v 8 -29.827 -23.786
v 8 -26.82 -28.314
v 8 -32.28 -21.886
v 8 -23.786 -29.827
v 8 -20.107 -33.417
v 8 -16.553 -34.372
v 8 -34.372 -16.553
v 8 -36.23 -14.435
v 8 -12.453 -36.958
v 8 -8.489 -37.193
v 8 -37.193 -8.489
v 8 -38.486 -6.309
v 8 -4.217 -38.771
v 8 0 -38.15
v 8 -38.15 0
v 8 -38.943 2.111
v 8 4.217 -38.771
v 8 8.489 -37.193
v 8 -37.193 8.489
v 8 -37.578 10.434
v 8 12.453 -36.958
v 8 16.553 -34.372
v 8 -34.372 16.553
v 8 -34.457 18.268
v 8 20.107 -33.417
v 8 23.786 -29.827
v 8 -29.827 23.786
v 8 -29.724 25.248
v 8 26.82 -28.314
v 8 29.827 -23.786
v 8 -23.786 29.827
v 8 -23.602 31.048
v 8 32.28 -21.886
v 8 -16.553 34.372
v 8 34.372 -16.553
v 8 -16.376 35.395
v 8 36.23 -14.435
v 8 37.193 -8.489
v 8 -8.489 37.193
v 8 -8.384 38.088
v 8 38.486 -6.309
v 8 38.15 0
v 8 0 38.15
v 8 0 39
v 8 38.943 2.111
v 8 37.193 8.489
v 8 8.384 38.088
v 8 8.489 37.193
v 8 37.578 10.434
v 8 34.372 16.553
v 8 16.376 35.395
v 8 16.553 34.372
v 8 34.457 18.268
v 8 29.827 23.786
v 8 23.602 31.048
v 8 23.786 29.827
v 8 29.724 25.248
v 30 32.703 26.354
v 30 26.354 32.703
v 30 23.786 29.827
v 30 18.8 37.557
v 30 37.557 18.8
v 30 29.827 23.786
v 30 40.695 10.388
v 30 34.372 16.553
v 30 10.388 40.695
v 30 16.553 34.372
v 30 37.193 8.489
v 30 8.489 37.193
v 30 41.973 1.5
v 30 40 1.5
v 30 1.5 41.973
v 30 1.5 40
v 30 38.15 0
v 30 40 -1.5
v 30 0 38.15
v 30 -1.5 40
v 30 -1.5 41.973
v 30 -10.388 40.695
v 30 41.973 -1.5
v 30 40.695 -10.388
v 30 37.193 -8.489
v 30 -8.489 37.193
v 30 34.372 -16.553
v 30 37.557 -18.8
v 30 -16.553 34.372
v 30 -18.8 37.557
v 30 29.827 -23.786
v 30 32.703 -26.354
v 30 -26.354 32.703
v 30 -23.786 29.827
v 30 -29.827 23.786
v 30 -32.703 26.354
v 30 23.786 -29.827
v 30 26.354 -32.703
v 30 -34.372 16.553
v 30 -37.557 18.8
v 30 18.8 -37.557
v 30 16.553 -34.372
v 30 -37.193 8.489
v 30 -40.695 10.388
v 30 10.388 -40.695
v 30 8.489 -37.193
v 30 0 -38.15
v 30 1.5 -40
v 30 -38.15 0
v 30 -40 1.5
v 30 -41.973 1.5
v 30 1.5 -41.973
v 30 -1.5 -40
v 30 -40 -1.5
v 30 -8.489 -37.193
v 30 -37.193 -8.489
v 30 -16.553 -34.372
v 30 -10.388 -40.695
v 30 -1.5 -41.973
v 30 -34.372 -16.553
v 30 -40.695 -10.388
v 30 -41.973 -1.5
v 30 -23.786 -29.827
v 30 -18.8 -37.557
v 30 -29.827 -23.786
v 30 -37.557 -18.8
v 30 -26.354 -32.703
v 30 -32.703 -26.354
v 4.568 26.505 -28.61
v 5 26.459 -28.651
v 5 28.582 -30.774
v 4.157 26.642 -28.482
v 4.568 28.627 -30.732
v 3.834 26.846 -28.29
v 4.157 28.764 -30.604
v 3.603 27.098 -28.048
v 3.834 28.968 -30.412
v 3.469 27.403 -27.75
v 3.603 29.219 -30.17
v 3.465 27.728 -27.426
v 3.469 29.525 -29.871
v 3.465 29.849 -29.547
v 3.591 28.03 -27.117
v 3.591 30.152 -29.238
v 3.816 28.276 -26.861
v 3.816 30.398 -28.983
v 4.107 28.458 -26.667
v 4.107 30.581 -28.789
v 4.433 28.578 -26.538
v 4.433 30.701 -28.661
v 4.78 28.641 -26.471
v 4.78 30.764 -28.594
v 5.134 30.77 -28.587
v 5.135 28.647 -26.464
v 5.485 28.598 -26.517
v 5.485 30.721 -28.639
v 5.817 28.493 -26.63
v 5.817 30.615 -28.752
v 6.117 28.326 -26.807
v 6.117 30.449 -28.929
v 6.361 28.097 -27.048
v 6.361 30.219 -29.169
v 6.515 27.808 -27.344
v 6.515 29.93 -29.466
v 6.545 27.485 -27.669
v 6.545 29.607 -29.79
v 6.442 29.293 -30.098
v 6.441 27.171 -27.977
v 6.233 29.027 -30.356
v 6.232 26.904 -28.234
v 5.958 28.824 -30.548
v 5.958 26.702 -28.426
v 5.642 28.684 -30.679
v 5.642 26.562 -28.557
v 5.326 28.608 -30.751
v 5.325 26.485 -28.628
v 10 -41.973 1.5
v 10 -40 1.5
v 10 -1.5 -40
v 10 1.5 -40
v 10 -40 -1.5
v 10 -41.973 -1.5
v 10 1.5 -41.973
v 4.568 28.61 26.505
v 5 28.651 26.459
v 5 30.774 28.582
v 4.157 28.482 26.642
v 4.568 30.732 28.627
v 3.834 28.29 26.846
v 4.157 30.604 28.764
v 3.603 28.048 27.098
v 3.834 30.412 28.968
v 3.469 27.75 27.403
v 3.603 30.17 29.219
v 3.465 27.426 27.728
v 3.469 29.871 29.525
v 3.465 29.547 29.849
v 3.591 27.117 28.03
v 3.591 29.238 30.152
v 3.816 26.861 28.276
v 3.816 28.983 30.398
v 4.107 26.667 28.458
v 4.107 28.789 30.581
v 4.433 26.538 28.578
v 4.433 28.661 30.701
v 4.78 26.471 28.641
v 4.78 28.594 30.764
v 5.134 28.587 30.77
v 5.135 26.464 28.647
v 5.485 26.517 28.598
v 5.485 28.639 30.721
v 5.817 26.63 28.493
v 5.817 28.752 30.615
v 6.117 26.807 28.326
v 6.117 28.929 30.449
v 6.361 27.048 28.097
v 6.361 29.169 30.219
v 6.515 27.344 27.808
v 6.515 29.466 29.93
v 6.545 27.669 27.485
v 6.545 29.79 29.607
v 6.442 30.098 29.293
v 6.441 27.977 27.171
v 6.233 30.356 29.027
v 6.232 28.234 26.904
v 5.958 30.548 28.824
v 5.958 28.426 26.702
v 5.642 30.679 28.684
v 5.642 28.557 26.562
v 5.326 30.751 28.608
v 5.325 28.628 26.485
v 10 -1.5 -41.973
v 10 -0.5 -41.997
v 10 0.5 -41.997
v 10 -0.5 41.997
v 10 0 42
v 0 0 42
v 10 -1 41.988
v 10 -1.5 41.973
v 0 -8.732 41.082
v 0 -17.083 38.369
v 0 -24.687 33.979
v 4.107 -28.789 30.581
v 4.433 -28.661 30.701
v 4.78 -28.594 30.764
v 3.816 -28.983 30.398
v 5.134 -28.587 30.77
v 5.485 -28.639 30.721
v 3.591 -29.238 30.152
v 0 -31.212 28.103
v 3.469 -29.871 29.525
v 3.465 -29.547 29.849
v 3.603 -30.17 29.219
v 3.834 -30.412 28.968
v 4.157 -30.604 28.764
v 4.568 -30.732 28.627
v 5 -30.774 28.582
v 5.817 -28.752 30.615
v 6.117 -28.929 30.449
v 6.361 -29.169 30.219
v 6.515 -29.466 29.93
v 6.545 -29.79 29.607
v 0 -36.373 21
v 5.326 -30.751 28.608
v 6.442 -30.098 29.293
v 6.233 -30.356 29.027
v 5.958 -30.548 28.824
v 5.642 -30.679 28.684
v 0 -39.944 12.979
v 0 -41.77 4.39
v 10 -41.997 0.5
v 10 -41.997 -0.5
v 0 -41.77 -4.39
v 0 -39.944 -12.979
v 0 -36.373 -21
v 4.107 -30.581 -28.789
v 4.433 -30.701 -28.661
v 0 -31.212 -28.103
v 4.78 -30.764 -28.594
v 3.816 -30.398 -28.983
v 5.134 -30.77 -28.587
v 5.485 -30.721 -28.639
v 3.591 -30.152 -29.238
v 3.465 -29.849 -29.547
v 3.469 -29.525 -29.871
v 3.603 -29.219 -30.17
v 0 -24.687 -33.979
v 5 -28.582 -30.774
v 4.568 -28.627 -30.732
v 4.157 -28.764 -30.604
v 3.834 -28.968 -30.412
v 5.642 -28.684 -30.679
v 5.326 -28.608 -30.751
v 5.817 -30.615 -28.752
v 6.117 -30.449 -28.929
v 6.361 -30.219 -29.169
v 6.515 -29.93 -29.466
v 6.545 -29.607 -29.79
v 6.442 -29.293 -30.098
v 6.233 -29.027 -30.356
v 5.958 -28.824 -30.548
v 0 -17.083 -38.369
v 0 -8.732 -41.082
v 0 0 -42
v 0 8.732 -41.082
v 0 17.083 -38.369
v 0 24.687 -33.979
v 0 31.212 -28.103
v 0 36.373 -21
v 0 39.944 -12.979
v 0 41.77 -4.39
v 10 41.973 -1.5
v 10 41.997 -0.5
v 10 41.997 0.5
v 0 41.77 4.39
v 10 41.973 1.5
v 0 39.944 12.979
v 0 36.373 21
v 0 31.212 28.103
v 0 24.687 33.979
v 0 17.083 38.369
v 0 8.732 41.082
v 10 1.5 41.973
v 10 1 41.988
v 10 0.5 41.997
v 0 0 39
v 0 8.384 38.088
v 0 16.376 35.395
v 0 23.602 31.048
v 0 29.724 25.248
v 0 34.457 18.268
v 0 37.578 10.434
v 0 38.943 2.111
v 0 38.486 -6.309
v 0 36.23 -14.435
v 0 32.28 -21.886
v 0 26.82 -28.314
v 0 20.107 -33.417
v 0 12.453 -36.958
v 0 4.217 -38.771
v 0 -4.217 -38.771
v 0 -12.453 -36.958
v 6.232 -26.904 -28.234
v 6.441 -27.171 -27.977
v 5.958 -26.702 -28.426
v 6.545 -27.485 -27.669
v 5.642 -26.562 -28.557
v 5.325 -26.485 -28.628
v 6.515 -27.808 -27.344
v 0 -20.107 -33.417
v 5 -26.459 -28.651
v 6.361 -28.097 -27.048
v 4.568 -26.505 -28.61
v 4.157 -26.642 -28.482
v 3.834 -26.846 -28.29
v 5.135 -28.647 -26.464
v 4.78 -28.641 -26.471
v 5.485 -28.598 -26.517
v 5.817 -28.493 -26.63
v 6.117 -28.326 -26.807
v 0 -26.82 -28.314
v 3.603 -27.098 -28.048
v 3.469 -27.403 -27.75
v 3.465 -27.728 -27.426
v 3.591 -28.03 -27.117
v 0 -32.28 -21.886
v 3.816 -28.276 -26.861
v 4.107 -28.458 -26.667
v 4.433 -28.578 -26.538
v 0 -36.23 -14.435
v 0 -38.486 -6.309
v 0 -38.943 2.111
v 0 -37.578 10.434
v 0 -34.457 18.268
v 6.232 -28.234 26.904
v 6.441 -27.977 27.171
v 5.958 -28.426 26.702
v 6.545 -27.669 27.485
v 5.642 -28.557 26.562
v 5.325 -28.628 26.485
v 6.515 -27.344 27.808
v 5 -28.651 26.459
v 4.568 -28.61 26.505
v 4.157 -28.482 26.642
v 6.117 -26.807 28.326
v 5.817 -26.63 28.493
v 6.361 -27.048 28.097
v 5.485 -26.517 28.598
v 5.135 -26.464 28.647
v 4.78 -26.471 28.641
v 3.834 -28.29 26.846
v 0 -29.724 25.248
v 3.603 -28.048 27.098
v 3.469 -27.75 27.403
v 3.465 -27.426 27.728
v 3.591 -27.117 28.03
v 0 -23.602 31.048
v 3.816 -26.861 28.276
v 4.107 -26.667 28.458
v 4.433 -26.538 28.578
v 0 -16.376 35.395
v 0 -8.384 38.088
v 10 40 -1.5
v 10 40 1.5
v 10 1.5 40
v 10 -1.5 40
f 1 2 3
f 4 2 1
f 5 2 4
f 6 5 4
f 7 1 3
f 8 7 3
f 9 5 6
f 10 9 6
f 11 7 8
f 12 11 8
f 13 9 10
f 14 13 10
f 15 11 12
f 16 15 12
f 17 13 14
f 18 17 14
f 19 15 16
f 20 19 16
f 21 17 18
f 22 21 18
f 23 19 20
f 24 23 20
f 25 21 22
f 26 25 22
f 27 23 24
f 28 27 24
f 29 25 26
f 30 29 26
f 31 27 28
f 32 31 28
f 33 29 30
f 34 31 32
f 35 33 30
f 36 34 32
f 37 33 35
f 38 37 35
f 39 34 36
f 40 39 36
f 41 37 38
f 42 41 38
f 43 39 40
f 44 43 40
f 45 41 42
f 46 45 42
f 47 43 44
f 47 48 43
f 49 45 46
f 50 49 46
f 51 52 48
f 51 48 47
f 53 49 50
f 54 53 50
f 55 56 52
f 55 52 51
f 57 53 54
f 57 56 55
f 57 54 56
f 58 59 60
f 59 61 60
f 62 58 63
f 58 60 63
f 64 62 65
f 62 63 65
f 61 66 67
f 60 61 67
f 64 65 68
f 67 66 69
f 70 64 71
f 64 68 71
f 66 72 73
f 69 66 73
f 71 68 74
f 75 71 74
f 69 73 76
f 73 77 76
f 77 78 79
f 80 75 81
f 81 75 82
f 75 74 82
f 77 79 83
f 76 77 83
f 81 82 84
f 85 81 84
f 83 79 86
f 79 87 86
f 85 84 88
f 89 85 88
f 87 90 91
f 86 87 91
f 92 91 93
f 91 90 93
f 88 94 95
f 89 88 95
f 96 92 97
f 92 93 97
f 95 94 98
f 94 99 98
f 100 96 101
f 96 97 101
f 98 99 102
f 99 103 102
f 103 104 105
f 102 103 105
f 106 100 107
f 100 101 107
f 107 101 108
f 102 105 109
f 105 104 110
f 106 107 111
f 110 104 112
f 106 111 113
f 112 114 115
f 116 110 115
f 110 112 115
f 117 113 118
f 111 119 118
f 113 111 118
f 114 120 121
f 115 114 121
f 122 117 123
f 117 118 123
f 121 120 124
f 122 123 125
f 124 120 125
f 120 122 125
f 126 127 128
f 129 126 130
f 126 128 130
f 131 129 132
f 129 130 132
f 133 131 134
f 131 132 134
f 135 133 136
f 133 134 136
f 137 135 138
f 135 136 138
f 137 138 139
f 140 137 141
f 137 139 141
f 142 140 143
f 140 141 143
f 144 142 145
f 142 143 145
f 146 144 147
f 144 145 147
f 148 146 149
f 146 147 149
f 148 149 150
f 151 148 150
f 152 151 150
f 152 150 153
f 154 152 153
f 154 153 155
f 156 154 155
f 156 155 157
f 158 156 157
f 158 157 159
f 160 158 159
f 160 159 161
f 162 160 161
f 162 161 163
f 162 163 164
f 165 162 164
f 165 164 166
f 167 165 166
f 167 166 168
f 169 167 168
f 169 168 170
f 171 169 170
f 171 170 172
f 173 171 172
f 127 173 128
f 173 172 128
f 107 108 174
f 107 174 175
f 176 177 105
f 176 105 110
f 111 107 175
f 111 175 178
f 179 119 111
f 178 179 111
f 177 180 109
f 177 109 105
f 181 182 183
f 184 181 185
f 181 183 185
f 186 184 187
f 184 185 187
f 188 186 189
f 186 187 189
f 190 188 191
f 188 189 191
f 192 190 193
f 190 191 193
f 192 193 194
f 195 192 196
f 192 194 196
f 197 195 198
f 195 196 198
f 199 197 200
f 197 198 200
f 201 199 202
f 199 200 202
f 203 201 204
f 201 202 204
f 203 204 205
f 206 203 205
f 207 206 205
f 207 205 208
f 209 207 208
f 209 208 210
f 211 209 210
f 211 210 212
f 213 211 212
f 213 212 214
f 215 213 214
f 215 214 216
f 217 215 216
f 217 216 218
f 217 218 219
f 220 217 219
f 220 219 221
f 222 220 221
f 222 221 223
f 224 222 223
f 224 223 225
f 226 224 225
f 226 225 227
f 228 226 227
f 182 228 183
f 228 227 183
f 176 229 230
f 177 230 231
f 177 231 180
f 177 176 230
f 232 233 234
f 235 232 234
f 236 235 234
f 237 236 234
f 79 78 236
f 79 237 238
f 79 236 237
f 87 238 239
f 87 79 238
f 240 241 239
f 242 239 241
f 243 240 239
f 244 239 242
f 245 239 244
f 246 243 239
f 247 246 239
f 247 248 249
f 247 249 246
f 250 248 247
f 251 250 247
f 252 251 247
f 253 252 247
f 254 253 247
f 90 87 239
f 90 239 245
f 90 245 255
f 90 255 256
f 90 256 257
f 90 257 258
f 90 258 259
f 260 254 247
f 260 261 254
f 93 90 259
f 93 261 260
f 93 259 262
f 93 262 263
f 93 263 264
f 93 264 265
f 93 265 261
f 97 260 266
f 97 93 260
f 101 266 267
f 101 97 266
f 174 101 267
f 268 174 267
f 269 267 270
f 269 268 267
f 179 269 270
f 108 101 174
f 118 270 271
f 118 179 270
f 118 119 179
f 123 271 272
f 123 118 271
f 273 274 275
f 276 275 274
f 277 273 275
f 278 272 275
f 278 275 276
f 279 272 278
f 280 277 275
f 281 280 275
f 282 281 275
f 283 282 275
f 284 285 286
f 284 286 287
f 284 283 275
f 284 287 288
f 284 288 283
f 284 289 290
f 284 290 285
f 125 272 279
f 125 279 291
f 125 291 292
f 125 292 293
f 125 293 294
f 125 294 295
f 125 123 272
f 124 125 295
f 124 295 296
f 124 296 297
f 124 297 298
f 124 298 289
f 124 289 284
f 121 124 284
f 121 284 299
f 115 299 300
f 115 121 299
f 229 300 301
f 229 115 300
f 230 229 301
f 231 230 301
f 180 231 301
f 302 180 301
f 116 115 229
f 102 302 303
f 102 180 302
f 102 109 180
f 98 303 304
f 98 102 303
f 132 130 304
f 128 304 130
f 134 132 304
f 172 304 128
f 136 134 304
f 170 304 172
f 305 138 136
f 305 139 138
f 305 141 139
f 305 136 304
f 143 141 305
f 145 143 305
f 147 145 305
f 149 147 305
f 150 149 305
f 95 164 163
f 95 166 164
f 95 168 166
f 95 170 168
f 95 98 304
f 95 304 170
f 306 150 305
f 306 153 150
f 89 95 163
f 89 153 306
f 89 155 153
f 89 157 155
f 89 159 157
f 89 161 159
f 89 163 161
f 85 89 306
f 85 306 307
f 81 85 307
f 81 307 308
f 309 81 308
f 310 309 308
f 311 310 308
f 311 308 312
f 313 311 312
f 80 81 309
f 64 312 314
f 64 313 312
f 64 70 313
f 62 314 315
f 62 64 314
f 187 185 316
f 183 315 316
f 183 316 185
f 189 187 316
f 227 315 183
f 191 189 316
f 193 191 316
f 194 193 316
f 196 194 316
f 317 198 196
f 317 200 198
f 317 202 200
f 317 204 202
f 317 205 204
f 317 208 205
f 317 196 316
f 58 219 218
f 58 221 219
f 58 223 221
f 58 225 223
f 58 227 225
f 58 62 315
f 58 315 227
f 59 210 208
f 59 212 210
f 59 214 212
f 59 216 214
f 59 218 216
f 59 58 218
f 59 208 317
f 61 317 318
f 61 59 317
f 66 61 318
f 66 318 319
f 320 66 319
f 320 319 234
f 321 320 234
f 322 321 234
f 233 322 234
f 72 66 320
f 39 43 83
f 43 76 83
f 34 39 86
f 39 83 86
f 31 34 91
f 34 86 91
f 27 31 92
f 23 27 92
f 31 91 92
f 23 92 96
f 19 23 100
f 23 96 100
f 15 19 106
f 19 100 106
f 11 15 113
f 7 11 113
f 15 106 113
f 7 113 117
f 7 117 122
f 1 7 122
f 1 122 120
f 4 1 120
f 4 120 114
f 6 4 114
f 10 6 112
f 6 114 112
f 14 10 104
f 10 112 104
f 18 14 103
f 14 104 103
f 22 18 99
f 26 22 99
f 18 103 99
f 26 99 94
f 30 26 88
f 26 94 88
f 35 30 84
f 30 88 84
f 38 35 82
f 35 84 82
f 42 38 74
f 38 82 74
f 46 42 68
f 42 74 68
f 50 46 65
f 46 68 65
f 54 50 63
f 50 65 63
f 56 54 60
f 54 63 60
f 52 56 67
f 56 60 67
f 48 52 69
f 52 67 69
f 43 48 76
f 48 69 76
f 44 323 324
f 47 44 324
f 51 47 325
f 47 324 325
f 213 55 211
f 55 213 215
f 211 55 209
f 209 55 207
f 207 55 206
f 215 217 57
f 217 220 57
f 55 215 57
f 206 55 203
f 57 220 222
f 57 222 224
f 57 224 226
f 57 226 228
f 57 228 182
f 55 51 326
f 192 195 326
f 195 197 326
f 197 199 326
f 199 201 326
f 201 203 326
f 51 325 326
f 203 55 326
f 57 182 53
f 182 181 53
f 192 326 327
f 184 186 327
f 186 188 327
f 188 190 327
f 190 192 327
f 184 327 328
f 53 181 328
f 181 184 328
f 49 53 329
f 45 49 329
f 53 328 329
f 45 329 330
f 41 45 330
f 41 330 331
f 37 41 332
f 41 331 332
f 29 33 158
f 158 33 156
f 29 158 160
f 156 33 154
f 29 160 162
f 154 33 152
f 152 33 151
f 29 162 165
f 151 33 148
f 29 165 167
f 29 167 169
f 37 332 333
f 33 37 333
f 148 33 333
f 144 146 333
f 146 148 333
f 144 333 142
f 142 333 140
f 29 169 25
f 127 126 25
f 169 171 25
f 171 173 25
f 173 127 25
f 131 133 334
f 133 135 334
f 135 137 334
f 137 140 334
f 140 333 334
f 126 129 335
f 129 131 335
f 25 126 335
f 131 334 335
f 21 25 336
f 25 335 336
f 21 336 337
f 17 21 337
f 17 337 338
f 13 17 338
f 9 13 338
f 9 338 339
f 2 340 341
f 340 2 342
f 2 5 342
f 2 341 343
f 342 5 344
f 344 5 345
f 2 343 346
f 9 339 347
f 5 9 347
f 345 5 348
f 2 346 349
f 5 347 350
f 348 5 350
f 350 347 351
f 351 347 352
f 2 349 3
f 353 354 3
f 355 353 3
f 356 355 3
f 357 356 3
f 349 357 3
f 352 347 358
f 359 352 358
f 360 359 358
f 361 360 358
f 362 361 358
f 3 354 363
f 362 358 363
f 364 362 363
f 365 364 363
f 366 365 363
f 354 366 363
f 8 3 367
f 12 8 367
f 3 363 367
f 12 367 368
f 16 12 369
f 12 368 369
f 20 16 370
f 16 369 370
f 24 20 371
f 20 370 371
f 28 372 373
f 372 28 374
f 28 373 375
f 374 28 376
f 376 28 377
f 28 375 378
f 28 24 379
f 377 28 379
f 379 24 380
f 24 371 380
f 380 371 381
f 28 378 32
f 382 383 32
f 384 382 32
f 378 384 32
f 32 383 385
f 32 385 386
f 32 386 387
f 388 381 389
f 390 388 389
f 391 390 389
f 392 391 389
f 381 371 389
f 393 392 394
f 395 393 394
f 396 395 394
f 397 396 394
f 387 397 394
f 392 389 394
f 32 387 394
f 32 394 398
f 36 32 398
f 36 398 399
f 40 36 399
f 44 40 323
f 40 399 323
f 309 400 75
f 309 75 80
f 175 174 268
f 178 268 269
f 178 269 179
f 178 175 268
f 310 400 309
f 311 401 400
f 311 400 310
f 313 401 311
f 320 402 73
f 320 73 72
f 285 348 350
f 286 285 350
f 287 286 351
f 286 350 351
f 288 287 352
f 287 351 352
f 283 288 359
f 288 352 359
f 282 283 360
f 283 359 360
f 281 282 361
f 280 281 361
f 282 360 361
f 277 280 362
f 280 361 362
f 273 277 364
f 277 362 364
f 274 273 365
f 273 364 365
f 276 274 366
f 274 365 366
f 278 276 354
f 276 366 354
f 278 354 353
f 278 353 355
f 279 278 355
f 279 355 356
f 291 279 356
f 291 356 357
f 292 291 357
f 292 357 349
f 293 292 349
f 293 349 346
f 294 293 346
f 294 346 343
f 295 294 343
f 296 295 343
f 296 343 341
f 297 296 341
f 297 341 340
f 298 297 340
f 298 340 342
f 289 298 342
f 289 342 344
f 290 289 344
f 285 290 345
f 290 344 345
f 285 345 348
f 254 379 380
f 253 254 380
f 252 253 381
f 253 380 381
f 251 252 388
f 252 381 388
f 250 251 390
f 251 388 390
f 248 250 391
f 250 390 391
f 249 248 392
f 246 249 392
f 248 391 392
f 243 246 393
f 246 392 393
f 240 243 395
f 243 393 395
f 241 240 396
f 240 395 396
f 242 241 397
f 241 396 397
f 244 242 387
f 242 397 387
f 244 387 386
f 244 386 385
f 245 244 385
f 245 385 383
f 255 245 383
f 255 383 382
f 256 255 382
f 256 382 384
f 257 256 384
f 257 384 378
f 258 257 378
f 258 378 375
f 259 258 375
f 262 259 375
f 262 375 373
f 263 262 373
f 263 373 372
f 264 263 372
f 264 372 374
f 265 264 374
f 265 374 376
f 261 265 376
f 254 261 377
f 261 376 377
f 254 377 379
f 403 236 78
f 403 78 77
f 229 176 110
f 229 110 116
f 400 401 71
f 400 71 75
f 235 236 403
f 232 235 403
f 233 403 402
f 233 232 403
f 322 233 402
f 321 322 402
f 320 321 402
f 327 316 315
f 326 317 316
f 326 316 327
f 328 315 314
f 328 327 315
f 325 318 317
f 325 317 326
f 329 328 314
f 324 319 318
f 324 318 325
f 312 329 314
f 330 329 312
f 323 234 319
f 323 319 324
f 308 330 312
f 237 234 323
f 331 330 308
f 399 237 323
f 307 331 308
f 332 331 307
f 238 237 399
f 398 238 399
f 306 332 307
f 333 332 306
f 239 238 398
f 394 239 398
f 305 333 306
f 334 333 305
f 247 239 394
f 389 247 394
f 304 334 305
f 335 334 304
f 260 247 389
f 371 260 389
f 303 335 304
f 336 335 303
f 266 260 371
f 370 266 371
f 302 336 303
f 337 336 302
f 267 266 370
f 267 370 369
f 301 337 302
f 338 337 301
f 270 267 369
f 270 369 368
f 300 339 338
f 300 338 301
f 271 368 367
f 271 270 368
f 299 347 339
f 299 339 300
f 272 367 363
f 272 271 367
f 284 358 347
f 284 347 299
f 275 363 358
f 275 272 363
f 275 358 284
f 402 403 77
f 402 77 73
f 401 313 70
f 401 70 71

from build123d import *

# Parameters (mm, degrees)
ESQUISSE1_W                  = 30
ESQUISSE1_H                  = 3.85
D_GAGEMENT_M2_51_D           = 3.1
R_P_TITION_CIRCULAIRE1_COUNT = 2
R_P_TITION_CIRCULAIRE1_ANGLE = 90
ESQUISSE4_W                  = 3
ESQUISSE4_H                  = 15
ENL_V_MAT_EXTRU_1_DEPTH      = 20
R_P_TITION_START             = 10
R_P_TITION_CIRCULAIRE2_DEPTH = 20
ESQUISSE5_R                  = 39
ENL_V_MAT_EXTRU_2_DEPTH      = 8


# Read off the part's stored shape, not the designer's step: Répétition circulaire2
with BuildPart() as part:
    # Esquisse1 → Révolution1 (revolve)
    with BuildSketch(Plane.XY, mode=Mode.PRIVATE) as r_volution1_sk:
        with Locations((15, 40.075)):
            Rectangle(ESQUISSE1_W, ESQUISSE1_H)
    revolve(r_volution1_sk.sketch.rotate(Axis((0, 0, 0), (1, 0, 0)), 90), axis=Axis((0, 0, 0), (1, 0, 0)))

    # Dégagement M2.51 (through all)
    with Locations(Plane(origin=(5, -29.69848481, -29.69848481), x_dir=(0, -0.707106781187, 0.707106781187), z_dir=(0, -0.707106781187, -0.707106781187))):
        with Locations((0, 0)):
            d_gagement_m2_51 = Hole(D_GAGEMENT_M2_51_D / 2)

    # Répétition circulaire1: Dégagement M2.51 ×2 about axis
    r_p_tition_circulaire1_axis = Axis((0, 0, 0), (-1, 0, 0))
    for i in range(1, R_P_TITION_CIRCULAIRE1_COUNT):
        add(d_gagement_m2_51.rotate(r_p_tition_circulaire1_axis, i * R_P_TITION_CIRCULAIRE1_ANGLE / (R_P_TITION_CIRCULAIRE1_COUNT - 1)), mode=Mode.SUBTRACT)

    # Esquisse4 → Enlèv. mat.-Extru.1 (cut)
    with BuildSketch(Plane(origin=(30, 0, 0), x_dir=(0, 0, -1), z_dir=(1, 0, 0))):
        with Locations((0, -47.5)):
            Rectangle(ESQUISSE4_W, ESQUISSE4_H)
    extrude(amount=-ENL_V_MAT_EXTRU_1_DEPTH, mode=Mode.SUBTRACT)

    # Répétition circulaire2 outline → Répétition circulaire2 (cut)
    with BuildSketch(Plane.YZ.offset(R_P_TITION_START)):
        with BuildLine():
            ThreePointArc((41.973205739, -1.5), (42, 0), (41.973205739, 1.5))
            Line((41.973205739, 1.5), (40, 1.5))
            Line((40, 1.5), (40, -1.5))
            Line((40, -1.5), (41.973205739, -1.5))
        make_face()
        with BuildLine():
            Line((1.5, 40), (1.5, 41.973205739))
            ThreePointArc((1.5, 41.973205739), (0, 42), (-1.5, 41.973205739))
            Line((-1.5, 41.973205739), (-1.5, 40))
            Line((-1.5, 40), (1.5, 40))
        make_face()
        with BuildLine():
            ThreePointArc((-1.5, -41.973205739), (0, -42), (1.5, -41.973205739))
            Line((1.5, -41.973205739), (1.5, -40))
            Line((1.5, -40), (-1.5, -40))
            Line((-1.5, -40), (-1.5, -41.973205739))
        make_face()
    extrude(amount=R_P_TITION_CIRCULAIRE2_DEPTH, mode=Mode.SUBTRACT)

    # Esquisse5 → Enlèv. mat.-Extru.2 (cut)
    with BuildSketch(Plane.ZY):
        Circle(ESQUISSE5_R)
    extrude(amount=-ENL_V_MAT_EXTRU_2_DEPTH, mode=Mode.SUBTRACT)


solid = part.part
